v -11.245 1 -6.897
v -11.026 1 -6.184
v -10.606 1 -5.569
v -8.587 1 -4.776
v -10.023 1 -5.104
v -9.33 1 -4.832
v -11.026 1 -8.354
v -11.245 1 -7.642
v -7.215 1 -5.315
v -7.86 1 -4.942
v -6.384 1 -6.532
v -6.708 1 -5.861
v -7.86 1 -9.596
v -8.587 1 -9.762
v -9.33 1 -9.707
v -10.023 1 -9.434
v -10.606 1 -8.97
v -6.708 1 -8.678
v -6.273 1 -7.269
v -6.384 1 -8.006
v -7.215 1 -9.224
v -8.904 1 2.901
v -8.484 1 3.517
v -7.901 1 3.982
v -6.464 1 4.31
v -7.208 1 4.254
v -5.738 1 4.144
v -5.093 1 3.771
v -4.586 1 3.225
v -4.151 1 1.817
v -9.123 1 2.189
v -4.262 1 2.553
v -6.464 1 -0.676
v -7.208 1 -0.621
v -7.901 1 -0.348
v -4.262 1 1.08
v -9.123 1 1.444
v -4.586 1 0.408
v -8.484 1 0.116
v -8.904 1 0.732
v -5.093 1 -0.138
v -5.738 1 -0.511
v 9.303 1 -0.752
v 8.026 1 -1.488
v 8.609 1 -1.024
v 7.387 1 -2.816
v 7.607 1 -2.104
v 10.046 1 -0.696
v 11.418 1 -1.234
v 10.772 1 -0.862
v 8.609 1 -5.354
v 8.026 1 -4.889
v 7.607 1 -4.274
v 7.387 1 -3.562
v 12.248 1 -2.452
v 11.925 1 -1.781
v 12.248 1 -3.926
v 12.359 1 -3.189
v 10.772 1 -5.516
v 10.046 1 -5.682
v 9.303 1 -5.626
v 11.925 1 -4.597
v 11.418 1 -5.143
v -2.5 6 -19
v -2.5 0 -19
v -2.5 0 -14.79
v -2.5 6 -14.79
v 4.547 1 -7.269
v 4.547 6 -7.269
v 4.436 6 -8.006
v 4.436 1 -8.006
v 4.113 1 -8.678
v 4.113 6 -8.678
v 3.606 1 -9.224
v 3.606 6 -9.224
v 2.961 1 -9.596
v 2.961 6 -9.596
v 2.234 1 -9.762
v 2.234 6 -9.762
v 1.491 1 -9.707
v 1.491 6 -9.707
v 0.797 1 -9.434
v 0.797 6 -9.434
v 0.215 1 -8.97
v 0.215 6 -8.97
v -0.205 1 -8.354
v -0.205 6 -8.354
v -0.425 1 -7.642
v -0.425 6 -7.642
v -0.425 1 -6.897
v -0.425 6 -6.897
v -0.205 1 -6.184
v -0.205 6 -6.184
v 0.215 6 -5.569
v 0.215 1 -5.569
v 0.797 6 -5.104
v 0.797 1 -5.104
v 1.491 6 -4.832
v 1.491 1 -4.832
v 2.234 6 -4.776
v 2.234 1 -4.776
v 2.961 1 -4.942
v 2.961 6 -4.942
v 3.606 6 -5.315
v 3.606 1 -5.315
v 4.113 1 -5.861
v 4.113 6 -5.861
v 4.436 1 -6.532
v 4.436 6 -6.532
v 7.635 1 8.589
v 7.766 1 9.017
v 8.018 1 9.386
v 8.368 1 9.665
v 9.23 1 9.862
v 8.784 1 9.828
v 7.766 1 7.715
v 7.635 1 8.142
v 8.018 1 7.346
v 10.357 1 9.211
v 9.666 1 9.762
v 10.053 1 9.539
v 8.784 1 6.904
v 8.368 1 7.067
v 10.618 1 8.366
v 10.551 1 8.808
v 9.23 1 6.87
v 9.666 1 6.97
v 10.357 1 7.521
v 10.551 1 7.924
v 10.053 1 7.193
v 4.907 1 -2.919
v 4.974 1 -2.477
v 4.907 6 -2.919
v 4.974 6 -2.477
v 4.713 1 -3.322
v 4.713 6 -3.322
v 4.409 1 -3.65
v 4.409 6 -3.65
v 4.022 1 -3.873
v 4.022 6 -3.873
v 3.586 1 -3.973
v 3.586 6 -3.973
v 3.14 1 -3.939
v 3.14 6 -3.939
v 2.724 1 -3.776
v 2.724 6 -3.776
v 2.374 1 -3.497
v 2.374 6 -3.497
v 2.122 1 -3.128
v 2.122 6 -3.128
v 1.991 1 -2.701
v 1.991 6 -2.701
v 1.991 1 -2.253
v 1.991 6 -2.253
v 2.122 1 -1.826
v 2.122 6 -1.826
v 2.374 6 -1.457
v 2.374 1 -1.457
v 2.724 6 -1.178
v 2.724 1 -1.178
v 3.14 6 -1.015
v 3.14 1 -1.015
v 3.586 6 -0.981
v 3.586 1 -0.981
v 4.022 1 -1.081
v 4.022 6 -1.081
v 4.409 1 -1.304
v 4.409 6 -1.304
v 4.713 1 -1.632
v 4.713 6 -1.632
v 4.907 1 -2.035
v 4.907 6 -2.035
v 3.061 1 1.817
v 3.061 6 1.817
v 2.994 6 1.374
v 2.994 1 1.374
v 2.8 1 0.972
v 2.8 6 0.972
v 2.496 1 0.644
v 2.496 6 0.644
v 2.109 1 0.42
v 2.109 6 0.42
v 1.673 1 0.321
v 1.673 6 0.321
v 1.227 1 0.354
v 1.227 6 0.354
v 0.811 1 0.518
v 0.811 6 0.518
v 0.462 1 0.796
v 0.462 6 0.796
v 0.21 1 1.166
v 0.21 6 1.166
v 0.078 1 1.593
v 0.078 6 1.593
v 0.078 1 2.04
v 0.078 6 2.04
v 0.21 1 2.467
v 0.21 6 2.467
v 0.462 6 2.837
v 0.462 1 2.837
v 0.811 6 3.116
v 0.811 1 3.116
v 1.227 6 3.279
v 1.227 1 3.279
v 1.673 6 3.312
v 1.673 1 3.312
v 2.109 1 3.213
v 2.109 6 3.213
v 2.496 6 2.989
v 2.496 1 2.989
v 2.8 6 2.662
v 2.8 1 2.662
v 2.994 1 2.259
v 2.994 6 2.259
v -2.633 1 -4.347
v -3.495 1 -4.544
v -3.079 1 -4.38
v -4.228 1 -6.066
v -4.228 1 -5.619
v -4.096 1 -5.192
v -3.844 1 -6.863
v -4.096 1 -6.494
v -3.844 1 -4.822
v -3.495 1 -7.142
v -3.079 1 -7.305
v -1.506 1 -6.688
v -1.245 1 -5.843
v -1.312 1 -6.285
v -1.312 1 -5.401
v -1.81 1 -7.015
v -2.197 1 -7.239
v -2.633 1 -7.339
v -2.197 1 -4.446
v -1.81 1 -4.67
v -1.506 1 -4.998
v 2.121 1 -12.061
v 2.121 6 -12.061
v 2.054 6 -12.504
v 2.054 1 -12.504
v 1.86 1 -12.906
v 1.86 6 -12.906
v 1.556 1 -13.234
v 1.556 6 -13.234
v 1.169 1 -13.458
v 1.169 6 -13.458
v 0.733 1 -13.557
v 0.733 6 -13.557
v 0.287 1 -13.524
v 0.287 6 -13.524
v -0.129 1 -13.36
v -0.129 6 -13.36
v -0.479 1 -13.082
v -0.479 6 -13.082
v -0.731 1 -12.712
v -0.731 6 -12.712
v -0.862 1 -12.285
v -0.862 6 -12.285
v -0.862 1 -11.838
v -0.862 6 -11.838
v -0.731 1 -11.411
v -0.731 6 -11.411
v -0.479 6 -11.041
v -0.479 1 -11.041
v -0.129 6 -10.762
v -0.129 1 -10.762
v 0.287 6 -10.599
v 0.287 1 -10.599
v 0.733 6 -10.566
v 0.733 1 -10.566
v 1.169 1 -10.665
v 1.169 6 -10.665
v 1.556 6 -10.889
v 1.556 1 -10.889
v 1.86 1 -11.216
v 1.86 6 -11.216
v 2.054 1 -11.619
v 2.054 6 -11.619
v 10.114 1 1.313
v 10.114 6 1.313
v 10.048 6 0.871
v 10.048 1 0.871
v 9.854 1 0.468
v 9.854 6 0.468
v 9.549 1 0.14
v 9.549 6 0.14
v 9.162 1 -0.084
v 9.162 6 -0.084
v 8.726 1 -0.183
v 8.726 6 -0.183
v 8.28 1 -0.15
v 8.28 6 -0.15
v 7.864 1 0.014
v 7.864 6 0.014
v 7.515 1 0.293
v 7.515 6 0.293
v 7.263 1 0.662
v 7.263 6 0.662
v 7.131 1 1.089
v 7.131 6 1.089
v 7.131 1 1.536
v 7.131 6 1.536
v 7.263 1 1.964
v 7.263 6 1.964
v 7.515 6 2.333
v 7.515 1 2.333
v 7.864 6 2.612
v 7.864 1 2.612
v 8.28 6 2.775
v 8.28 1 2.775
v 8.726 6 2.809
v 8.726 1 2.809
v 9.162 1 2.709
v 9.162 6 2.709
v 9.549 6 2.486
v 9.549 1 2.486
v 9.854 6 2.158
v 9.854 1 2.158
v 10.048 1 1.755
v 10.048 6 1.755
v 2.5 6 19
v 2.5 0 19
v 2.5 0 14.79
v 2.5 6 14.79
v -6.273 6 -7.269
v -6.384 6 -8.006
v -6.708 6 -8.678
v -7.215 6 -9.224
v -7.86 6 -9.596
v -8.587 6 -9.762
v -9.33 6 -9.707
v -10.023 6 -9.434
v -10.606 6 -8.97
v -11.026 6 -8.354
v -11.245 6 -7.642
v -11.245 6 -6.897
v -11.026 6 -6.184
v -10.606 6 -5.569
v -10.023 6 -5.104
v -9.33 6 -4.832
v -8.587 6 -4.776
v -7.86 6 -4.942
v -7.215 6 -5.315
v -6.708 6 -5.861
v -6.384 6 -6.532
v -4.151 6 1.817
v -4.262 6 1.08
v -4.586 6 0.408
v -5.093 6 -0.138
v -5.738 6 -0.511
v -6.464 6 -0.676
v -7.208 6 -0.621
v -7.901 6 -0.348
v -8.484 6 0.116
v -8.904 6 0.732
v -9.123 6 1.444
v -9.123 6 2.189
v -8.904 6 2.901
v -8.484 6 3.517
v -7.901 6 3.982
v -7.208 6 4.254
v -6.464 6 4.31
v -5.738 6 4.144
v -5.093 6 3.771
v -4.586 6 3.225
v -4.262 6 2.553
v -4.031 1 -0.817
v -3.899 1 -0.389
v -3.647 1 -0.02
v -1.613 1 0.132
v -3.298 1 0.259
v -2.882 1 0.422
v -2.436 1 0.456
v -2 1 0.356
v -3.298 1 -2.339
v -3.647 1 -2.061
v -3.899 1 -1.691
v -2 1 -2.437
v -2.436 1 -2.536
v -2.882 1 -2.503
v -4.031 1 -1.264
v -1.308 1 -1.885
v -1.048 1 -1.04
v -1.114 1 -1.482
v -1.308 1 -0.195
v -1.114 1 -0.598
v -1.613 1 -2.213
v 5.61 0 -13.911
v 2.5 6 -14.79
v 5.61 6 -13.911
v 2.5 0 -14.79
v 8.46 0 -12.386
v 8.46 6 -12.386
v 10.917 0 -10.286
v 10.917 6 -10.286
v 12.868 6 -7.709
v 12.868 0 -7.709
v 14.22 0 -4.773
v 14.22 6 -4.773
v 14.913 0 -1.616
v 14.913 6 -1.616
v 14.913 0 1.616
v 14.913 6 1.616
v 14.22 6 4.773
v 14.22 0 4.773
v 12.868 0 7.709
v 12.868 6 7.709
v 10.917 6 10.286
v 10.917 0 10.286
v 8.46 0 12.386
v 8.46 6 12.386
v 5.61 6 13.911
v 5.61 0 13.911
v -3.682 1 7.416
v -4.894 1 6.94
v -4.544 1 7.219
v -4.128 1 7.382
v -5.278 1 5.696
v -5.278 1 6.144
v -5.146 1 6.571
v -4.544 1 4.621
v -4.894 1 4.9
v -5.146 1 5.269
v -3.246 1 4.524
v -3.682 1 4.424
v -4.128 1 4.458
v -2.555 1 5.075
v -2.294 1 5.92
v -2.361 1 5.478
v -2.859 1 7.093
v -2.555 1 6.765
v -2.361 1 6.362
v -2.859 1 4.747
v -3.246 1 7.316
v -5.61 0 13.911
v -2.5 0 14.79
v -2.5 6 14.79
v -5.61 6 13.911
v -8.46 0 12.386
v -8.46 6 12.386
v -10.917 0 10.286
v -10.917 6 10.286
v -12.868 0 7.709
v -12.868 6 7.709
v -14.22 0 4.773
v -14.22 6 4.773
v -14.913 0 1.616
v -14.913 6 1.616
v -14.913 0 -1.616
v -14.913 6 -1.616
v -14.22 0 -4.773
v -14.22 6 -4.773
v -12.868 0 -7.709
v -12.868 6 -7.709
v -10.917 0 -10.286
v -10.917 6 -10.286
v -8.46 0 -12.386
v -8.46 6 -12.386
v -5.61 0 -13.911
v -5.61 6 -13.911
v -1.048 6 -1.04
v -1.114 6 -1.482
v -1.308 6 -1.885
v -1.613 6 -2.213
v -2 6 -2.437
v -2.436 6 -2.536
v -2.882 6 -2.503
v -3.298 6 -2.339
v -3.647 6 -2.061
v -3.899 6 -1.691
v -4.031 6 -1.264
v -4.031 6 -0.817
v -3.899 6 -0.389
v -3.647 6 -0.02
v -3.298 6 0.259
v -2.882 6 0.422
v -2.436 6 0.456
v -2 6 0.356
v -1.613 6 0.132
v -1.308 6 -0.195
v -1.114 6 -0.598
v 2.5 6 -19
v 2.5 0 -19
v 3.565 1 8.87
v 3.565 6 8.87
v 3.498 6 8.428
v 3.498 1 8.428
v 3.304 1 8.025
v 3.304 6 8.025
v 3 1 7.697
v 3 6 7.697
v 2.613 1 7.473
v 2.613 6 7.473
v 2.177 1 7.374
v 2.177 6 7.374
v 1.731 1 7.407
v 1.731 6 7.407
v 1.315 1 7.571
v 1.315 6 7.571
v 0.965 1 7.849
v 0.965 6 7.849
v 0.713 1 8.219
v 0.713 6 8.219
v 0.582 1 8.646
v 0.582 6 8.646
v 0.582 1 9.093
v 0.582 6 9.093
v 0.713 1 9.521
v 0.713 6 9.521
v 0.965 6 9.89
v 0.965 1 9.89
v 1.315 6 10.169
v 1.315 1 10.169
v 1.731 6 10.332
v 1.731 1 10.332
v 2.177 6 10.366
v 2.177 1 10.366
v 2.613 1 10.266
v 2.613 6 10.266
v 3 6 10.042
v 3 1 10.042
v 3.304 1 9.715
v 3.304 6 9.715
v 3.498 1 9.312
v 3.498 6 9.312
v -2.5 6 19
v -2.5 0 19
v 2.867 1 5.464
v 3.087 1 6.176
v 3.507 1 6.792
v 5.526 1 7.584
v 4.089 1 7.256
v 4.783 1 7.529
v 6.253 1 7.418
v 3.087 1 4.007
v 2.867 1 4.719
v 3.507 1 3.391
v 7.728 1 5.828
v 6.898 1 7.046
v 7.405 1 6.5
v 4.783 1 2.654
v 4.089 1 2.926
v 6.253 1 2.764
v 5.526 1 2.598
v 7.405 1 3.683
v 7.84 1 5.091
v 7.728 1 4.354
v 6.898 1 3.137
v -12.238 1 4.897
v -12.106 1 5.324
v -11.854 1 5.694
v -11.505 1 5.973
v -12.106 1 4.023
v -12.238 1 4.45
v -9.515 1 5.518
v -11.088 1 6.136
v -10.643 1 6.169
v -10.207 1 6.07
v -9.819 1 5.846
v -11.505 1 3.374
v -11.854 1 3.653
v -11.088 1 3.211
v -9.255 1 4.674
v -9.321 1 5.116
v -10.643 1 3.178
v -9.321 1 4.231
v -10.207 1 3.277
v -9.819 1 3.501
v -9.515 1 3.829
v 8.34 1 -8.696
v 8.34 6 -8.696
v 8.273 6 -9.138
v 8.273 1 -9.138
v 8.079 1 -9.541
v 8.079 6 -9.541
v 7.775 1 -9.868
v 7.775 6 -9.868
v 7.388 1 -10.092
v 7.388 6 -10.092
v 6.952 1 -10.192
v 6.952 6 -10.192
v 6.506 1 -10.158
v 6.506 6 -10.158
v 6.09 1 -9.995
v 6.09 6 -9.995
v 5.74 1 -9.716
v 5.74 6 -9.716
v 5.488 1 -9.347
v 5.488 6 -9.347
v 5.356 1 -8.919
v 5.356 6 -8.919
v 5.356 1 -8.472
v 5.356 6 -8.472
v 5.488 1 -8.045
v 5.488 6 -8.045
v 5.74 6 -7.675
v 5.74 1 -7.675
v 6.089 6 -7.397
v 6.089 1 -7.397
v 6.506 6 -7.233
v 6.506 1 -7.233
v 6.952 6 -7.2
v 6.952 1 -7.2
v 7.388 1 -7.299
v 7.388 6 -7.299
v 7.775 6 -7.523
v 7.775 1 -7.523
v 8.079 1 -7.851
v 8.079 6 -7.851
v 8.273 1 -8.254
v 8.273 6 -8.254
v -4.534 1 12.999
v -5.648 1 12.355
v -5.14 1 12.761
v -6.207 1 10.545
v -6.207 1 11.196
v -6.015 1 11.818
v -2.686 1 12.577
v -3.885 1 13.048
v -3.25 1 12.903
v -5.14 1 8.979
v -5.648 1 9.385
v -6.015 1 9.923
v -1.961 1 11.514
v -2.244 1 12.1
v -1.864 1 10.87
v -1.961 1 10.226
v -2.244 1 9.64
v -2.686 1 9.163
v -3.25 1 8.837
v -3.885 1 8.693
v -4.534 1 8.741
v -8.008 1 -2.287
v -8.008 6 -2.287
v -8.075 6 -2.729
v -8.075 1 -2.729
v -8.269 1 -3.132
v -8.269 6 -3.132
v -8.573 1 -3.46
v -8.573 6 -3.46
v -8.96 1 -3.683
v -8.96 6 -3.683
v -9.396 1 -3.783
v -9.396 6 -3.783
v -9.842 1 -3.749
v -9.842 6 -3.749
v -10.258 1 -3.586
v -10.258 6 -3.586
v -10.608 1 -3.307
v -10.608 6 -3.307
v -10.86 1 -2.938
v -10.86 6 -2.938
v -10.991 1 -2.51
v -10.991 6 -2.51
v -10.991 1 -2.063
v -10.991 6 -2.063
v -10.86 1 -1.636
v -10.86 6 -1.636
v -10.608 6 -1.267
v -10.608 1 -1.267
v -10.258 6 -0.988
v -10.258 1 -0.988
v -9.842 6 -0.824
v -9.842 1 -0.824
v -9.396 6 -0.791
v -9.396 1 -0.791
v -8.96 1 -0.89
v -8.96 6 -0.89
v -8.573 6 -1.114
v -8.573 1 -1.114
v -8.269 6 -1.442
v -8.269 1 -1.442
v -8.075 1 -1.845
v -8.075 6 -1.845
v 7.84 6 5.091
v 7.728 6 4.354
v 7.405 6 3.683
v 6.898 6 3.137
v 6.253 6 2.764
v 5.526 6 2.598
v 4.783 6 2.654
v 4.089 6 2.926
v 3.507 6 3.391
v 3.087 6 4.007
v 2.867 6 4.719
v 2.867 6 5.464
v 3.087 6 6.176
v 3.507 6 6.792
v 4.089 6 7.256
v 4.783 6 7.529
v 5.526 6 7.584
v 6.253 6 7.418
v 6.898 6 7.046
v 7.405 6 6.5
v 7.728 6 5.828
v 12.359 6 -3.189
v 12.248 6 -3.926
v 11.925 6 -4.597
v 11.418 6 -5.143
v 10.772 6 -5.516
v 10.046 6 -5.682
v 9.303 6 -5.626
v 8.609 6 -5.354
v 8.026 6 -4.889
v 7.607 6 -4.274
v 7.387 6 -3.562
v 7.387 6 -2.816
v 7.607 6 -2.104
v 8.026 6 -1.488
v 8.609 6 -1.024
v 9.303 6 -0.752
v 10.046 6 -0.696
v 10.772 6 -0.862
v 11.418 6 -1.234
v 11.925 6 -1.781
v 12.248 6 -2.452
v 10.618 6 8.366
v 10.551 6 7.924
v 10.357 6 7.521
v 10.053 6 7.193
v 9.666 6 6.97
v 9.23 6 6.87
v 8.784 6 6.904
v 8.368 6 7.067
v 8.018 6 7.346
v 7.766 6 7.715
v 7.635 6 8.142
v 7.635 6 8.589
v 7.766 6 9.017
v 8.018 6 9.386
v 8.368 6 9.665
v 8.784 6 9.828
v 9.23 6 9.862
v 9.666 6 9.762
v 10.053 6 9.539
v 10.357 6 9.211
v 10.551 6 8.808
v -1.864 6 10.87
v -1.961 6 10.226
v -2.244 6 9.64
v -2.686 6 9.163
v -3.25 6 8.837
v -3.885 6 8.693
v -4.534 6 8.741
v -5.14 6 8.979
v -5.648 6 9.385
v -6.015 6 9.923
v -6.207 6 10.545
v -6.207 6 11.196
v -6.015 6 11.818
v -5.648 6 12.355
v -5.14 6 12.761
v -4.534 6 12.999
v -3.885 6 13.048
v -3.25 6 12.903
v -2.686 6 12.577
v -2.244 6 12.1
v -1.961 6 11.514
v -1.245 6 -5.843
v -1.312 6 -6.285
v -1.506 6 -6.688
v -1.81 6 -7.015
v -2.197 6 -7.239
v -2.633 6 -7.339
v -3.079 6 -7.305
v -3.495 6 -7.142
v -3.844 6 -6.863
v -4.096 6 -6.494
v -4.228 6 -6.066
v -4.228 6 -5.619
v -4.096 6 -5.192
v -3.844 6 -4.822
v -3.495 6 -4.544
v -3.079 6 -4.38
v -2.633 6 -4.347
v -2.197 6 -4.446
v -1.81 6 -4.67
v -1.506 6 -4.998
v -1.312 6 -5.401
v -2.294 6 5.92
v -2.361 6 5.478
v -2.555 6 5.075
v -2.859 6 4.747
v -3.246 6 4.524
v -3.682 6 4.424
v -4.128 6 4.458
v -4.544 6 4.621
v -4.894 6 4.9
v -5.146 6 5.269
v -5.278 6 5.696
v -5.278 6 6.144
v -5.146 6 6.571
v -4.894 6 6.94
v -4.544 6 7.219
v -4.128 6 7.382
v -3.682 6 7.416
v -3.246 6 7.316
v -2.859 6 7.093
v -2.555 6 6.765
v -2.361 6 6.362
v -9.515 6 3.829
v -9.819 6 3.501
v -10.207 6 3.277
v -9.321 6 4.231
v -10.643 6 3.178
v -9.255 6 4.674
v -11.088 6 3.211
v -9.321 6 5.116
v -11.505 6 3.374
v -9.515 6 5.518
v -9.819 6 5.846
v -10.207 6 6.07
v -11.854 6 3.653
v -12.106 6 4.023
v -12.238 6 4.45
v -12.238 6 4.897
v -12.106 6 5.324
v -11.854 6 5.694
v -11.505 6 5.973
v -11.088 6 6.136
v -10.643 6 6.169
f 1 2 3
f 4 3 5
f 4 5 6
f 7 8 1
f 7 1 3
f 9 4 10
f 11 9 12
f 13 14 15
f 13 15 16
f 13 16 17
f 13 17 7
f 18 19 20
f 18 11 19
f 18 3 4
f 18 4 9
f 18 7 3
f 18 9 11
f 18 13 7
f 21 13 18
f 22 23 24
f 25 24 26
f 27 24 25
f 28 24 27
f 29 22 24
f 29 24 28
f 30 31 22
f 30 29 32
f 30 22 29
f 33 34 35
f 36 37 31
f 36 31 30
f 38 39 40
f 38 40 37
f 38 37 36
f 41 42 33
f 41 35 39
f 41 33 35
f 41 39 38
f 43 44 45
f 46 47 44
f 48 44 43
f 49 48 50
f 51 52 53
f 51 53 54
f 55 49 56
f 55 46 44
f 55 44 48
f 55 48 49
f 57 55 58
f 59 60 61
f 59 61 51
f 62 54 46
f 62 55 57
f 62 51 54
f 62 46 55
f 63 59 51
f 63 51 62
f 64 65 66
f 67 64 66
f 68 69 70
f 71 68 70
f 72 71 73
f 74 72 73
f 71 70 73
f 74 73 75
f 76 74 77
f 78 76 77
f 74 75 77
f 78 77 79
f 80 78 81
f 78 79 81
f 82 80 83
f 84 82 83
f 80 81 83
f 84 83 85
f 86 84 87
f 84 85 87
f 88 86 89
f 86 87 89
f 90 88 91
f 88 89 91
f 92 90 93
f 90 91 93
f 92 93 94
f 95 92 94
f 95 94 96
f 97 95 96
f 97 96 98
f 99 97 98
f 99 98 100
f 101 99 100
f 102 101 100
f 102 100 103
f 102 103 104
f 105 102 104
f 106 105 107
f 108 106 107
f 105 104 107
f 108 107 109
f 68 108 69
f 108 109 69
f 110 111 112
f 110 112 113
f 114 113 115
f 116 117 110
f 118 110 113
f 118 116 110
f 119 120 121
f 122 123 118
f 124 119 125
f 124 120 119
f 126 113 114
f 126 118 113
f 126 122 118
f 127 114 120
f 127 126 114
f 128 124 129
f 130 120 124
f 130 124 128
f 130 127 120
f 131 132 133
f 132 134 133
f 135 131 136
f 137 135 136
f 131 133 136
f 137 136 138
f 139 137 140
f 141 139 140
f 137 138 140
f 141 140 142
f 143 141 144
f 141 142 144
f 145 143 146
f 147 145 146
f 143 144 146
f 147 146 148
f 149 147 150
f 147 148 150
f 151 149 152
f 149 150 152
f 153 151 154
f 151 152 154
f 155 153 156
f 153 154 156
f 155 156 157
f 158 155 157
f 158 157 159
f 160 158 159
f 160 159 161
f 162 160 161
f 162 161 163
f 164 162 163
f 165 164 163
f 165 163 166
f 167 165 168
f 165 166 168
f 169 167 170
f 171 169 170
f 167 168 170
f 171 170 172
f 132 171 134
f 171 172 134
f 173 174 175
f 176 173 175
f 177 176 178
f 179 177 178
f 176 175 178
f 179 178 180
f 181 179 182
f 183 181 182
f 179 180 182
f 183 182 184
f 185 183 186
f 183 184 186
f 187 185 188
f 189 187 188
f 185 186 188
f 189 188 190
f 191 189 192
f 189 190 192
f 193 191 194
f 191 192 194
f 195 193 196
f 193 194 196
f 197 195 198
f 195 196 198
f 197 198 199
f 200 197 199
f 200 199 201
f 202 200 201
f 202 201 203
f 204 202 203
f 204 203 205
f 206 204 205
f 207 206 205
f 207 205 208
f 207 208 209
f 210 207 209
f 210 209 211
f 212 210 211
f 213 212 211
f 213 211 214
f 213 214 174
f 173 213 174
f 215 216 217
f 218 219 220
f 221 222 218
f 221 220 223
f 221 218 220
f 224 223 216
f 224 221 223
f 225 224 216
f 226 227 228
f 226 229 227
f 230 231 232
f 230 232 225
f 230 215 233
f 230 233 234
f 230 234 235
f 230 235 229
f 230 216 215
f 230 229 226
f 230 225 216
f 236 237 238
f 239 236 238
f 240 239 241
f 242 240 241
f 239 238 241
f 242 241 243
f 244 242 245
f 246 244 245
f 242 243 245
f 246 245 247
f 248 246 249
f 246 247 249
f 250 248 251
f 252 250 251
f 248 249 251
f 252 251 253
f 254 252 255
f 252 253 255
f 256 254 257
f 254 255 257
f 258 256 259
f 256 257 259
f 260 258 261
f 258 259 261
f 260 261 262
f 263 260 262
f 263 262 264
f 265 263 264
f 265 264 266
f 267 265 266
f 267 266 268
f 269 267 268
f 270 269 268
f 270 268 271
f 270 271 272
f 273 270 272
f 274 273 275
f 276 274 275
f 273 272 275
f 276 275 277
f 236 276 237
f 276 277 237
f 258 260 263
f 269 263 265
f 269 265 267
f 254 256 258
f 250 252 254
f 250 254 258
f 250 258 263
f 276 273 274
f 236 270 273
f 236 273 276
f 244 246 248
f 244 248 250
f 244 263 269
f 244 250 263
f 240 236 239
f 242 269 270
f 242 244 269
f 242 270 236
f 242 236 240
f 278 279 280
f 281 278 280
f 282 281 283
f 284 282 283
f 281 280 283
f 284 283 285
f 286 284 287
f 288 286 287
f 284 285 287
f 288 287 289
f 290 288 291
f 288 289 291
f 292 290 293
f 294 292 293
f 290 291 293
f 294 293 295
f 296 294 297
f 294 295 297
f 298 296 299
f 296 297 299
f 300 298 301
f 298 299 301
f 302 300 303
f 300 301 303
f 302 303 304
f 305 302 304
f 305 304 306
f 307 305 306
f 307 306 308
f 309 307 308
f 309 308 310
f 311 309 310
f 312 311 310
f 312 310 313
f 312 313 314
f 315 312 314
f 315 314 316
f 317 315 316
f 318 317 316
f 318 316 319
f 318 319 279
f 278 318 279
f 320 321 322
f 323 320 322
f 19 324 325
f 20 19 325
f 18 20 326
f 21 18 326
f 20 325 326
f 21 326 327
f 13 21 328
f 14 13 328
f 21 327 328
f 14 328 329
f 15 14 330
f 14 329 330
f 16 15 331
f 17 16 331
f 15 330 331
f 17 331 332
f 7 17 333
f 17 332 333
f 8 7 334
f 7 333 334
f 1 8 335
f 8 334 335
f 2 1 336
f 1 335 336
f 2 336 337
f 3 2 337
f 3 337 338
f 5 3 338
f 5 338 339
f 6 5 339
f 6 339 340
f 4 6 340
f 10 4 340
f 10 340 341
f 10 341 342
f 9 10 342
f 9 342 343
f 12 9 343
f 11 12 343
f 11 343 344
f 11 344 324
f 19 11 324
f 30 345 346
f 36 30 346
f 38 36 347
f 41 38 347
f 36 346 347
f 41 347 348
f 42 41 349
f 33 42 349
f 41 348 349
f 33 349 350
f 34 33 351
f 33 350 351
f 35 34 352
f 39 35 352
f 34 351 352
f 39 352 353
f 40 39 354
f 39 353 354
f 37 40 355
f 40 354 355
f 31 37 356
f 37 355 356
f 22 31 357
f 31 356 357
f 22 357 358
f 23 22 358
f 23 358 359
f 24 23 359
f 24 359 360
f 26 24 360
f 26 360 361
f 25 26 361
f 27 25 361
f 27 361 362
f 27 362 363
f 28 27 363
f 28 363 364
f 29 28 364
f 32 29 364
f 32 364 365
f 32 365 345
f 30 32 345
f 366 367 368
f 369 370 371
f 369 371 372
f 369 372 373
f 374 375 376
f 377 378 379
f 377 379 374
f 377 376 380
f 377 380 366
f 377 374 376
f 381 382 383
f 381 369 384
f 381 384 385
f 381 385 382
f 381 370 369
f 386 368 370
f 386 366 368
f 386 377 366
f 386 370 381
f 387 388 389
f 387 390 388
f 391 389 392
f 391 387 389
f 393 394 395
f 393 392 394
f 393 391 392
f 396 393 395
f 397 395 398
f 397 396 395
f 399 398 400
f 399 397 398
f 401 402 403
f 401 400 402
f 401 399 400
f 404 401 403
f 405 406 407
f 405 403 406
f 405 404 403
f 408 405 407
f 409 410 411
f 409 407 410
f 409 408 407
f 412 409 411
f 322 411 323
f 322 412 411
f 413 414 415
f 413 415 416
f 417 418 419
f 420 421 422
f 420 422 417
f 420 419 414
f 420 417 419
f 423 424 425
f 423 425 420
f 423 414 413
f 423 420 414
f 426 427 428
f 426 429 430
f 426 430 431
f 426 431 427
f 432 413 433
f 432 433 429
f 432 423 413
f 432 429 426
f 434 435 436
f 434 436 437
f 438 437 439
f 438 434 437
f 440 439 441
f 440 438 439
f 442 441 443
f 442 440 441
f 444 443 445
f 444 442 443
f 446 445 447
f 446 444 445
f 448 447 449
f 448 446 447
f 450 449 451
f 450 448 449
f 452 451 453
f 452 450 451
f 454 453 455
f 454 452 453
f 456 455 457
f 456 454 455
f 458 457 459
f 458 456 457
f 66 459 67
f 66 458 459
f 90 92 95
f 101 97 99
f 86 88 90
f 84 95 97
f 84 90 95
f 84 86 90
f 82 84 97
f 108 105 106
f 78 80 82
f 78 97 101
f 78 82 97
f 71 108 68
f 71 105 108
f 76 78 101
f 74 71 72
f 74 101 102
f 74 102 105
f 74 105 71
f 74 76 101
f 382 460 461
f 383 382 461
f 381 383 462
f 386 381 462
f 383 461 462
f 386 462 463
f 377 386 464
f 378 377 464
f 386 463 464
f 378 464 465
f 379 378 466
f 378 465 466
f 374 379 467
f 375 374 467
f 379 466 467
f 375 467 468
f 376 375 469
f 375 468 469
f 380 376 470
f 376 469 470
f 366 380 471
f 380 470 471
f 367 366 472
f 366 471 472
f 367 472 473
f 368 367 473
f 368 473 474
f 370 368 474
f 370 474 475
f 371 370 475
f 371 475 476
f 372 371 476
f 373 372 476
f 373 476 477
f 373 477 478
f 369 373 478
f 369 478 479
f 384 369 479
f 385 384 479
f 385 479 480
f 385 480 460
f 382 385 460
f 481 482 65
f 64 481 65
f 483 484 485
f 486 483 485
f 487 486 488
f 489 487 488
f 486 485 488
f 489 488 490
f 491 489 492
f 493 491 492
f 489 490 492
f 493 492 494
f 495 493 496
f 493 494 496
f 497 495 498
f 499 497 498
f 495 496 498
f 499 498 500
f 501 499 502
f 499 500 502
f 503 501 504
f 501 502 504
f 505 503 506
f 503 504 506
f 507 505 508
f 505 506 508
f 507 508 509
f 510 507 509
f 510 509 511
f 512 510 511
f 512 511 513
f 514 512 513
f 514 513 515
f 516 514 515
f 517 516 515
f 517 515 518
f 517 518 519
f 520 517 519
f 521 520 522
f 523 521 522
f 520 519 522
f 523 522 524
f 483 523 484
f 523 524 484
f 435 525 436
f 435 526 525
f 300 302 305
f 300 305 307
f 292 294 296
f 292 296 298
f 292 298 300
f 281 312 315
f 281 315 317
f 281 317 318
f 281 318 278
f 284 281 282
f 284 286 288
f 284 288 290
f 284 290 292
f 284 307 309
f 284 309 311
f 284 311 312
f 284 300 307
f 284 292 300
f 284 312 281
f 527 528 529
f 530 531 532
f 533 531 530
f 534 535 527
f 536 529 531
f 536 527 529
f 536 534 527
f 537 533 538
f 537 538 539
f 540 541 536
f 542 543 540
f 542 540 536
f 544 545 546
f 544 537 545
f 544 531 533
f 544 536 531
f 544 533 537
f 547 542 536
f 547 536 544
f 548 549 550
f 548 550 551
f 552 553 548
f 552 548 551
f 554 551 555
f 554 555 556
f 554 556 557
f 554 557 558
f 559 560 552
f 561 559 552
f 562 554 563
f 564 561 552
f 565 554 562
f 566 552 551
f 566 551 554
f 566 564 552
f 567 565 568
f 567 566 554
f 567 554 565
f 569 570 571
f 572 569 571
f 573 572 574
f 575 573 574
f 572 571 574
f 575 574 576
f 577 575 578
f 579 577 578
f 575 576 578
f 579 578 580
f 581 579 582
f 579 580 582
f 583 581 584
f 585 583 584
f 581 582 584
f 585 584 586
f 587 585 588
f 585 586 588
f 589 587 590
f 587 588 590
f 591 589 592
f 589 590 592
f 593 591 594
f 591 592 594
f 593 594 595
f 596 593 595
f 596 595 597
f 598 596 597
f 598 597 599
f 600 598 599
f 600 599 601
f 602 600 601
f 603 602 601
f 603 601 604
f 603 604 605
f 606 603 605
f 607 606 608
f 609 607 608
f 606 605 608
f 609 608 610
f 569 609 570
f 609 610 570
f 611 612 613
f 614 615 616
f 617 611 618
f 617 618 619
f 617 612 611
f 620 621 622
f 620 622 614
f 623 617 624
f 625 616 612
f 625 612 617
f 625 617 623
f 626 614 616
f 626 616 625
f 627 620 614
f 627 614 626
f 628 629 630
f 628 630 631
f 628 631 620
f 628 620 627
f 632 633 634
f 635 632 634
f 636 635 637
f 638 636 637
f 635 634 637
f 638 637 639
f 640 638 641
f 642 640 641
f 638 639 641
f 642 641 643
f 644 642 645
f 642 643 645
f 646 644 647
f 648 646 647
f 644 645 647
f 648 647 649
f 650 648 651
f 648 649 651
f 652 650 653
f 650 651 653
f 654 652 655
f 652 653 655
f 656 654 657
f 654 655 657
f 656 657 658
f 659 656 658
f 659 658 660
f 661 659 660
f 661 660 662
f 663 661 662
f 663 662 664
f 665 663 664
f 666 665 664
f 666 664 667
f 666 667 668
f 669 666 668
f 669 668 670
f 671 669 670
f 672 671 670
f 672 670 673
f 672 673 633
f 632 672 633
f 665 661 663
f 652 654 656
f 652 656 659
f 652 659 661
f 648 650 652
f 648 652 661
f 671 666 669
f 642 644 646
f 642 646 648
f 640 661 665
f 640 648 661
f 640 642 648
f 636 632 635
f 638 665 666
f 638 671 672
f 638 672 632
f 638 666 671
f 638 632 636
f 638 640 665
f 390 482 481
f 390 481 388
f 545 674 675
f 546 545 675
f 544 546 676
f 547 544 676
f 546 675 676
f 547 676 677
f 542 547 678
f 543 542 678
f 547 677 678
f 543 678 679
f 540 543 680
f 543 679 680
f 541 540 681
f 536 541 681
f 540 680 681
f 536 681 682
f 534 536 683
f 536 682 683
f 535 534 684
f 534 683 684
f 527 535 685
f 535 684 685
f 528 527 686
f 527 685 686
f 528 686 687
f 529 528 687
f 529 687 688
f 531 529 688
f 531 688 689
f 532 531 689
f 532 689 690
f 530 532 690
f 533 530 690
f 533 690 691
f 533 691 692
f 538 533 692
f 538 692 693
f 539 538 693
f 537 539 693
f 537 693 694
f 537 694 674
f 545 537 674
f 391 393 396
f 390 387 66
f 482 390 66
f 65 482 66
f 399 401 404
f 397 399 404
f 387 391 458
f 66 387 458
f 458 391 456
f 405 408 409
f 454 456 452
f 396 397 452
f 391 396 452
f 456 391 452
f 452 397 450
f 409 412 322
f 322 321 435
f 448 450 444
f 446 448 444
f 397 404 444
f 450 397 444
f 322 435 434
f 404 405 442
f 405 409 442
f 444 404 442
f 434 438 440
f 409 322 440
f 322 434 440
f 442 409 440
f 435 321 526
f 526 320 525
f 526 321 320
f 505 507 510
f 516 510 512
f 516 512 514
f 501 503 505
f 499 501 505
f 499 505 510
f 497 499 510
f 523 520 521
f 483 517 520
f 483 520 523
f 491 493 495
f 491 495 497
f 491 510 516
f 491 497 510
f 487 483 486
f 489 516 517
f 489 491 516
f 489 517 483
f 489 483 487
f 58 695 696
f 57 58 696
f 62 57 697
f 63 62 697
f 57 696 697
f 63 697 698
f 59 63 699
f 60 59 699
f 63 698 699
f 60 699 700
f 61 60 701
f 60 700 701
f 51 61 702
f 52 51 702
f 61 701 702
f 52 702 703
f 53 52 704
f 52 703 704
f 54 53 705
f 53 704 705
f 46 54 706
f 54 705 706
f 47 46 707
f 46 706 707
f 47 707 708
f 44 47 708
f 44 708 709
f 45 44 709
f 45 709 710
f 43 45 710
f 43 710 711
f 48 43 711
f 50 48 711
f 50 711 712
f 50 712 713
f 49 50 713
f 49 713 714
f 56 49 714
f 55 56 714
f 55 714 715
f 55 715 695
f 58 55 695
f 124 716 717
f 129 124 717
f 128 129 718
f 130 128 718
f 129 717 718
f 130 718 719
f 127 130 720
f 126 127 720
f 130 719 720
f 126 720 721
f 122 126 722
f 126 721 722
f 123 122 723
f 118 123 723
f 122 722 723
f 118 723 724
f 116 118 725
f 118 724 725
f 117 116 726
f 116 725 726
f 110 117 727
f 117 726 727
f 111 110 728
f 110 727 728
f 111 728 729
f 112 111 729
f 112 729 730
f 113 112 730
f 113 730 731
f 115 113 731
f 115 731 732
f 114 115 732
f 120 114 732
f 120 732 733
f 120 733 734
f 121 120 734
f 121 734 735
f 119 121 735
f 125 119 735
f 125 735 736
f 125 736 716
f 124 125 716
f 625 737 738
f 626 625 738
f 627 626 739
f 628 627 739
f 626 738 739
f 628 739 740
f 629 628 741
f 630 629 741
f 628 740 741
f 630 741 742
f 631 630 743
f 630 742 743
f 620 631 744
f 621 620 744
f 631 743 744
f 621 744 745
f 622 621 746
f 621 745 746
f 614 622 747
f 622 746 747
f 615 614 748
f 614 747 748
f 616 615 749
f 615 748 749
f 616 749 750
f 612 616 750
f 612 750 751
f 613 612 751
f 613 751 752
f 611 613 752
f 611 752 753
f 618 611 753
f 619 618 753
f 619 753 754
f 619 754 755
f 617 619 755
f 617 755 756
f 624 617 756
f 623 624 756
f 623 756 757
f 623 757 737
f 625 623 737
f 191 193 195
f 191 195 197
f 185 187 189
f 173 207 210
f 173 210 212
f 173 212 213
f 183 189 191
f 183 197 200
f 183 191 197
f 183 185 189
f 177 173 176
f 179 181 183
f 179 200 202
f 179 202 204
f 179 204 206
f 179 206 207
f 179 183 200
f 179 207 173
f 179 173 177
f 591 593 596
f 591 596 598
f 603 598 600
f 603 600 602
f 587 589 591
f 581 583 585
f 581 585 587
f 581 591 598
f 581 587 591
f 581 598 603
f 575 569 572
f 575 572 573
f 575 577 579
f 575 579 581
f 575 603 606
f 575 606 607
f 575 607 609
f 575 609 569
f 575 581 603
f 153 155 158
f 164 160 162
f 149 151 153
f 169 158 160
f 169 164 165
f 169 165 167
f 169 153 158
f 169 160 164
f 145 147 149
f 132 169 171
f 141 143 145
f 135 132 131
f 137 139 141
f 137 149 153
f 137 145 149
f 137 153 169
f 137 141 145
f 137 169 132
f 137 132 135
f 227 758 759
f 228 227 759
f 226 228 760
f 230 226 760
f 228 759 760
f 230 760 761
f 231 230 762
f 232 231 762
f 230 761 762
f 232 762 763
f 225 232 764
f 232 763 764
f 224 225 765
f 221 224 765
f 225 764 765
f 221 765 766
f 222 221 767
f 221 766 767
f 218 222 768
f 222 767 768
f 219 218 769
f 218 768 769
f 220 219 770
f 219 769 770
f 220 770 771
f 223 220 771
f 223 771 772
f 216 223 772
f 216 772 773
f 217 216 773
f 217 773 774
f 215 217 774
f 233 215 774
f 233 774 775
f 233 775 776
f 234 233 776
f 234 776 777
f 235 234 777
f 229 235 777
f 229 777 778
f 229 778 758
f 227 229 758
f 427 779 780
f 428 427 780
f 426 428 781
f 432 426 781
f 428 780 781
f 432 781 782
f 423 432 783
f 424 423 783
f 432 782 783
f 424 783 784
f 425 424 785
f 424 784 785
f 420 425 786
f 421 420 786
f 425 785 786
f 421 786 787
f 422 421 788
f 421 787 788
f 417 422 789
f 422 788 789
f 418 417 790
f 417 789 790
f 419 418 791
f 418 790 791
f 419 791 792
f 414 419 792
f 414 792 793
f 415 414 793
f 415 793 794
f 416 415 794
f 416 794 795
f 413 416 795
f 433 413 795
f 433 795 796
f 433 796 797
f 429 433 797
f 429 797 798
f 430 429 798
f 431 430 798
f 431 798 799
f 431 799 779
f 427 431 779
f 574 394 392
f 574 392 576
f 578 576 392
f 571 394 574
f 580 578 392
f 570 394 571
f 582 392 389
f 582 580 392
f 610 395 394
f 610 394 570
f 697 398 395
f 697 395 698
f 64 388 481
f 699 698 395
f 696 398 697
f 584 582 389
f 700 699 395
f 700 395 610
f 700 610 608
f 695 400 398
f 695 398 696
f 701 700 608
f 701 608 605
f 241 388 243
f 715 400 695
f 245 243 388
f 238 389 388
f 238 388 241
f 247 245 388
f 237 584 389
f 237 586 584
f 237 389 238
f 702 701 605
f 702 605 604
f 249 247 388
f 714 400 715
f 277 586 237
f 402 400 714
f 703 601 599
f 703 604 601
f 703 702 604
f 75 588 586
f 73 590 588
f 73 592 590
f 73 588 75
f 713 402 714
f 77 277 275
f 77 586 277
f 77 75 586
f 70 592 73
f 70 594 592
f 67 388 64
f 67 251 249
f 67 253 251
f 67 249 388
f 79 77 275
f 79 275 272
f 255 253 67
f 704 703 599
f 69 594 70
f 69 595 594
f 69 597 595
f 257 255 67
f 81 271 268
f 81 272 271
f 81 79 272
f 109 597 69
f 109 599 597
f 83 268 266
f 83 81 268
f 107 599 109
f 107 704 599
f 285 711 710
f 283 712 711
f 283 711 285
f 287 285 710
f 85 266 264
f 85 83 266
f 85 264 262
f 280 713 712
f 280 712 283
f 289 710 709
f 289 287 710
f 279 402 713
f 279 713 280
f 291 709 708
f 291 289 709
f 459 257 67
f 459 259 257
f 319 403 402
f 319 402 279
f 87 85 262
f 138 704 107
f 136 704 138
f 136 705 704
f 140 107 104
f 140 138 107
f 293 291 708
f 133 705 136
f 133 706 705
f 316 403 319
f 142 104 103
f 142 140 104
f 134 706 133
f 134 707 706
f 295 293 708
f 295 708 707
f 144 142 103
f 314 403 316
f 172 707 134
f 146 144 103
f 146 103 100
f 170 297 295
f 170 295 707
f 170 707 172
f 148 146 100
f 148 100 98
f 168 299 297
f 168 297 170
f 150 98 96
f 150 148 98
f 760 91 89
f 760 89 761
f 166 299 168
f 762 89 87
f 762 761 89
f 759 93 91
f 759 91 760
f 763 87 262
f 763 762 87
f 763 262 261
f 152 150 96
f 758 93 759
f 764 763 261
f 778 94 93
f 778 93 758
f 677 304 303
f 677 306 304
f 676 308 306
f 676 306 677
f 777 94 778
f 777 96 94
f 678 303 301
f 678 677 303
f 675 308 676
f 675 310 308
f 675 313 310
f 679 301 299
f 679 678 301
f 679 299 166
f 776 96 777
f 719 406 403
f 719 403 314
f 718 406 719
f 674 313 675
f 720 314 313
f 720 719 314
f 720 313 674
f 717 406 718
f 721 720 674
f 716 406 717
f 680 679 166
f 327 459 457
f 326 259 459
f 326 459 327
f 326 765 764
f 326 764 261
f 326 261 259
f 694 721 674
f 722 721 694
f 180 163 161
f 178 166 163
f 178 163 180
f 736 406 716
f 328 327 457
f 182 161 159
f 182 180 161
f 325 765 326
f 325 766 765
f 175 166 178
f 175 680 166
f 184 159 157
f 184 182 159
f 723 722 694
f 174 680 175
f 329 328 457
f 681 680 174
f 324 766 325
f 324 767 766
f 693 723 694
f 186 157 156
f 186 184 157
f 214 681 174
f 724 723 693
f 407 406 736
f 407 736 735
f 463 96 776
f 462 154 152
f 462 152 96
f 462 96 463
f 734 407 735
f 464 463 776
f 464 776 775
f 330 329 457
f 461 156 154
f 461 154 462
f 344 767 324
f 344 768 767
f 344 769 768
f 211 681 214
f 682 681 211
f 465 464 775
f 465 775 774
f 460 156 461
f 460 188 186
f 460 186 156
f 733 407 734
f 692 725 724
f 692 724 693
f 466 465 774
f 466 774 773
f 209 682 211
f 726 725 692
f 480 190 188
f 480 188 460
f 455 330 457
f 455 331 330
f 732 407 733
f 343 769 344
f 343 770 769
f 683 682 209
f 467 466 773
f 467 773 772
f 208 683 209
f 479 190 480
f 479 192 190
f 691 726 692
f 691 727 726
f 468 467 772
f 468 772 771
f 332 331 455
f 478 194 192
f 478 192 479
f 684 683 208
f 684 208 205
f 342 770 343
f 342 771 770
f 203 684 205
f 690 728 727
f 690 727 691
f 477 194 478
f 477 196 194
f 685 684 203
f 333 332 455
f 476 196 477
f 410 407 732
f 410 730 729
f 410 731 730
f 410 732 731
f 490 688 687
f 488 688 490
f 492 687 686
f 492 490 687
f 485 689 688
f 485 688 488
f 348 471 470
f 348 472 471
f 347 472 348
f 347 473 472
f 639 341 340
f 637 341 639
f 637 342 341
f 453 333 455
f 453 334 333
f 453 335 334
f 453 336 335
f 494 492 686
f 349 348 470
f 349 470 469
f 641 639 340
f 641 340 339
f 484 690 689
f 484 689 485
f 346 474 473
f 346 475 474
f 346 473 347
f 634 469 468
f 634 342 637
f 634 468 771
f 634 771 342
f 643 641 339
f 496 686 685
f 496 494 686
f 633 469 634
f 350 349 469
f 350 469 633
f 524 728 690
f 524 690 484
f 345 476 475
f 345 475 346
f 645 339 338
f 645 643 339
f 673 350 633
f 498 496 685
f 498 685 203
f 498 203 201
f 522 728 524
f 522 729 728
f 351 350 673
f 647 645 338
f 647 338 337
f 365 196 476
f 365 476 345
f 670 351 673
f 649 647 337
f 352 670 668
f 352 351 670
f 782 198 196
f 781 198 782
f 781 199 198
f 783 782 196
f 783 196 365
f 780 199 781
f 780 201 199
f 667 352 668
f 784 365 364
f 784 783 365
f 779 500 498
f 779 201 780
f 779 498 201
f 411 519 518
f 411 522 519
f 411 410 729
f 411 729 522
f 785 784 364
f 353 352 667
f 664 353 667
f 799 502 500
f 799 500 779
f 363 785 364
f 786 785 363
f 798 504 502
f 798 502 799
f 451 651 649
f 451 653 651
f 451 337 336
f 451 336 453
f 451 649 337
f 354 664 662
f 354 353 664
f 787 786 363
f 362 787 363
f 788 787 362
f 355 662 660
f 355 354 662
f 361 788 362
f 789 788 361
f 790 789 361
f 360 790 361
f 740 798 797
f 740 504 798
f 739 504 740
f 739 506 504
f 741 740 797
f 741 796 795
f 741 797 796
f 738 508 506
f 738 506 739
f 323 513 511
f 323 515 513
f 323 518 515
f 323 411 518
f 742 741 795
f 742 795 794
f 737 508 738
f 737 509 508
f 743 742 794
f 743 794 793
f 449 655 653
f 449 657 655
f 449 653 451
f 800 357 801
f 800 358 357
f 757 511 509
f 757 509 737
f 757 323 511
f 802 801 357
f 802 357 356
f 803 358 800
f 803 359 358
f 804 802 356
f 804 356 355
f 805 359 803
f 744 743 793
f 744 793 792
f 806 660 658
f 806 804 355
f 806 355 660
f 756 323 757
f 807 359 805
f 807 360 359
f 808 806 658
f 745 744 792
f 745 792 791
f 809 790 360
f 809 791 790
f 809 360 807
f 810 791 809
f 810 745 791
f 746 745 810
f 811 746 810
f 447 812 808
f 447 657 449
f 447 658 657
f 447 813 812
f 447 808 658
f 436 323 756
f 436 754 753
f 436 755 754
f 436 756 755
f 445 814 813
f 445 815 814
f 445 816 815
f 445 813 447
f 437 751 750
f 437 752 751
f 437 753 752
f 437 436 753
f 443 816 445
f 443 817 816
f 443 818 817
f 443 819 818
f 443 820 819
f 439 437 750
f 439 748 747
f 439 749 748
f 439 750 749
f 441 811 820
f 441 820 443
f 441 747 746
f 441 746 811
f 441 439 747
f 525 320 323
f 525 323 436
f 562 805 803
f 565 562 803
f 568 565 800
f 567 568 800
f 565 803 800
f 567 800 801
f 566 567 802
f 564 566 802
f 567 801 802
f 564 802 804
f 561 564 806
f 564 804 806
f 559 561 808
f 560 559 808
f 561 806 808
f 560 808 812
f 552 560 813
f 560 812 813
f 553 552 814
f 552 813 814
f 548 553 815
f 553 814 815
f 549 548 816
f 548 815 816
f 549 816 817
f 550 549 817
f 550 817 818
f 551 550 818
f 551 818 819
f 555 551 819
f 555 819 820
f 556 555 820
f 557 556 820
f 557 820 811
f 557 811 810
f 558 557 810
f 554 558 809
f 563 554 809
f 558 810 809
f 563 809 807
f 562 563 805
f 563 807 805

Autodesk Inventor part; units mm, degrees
ref_plane "YZ Plane" through (0, 0, 0) normal (1, 0, 0) x (0, 1, 0)
ref_plane "XZ Plane" through (0, 0, 0) normal (0, 1, 0) x (-1, 0, 0)
ref_plane "XY Plane" through (0, 0, 0) normal (0, 0, 1) x (1, 0, 0)
sketch "Sketch1" plane through (0, 0, 0) normal (0, 1, 0) x (-1, 0, 0)
  circle A0 centre (0, 0) radius 15
  line L0 (0, -15) -> (0, -19)
  line L1 (0, -19) -> (2.5, -19)
  line L2 (2.5, -19) -> (2.5, -14.7902)
  line L3 (0, -19) -> (-2.5, -19)
  line L4 (-2.5, -19) -> (-2.5, -14.7902)
  line L5 (6.6169, 0) -> (-6.6879, 0)
  line L6 (0, 15) -> (0, 19)
  line L7 (0, 19) -> (2.5, 19)
  line L8 (2.5, 19) -> (2.5, 14.7902)
  line L9 (0, 19) -> (-2.5, 19)
  line L10 (-2.5, 19) -> (-2.5, 14.7902)
  point P0 (2.5, 14.7902)
  point P1 (-2.5, 14.7902)
  dimension "d0" = 4
  dimension "d1" = 2.5
  dimension "d13" = 30
extrude "Extrusion1" add sketch "Sketch1" along normal blind 6
sketch "Sketch2" plane through (0, 6, 0) normal (0, 1, 0) x (1, 0, 0)
  circle A0 centre (2.0473, 7.2692) radius 2.5
  circle A1 centre (2.0473, 7.2692) radius 5 construction
  circle A2 centre (6.8395, 8.6957) radius 1.5
  circle A3 centre (2.0473, 7.2692) radius 5 construction
  circle A4 centre (0.6208, 12.0614) radius 1.5
  circle A5 centre (2.0473, 7.2692) radius 5 construction
  circle A6 centre (-2.7449, 5.8427) radius 1.5
  circle A7 centre (2.0473, 7.2692) radius 5 construction
  circle A8 centre (3.4738, 2.477) radius 1.5
  circle A9 centre (-6.6513, -1.8166) radius 2.5
  circle A10 centre (-6.6513, -1.8166) radius 5 construction
  circle A11 centre (-9.5082, 2.2868) radius 1.5
  circle A12 centre (-6.6513, -1.8166) radius 5 construction
  circle A13 centre (-10.7547, -4.6735) radius 1.5
  circle A14 centre (-6.6513, -1.8166) radius 5 construction
  circle A15 centre (-3.7944, -5.92) radius 1.5
  circle A16 centre (-6.6513, -1.8166) radius 5 construction
  circle A17 centre (-2.5478, 1.0403) radius 1.5
  circle A18 centre (5.3395, -5.0913) radius 2.5
  circle A19 centre (5.3395, -5.0913) radius 5 construction
  circle A20 centre (2.0648, -8.8697) radius 1.5
  circle A21 centre (5.3395, -5.0913) radius 5 construction
  circle A22 centre (9.1179, -8.3659) radius 1.5
  circle A23 centre (5.3395, -5.0913) radius 5 construction
  circle A24 centre (8.6142, -1.3128) radius 1.5
  circle A25 centre (5.3395, -5.0913) radius 5 construction
  circle A26 centre (1.5611, -1.8166) radius 1.5
  circle A27 centre (-8.7734, 7.2692) radius 2.5
  circle A28 centre (9.859, 3.1889) radius 2.5
  circle A29 centre (-4.0478, -10.8701) radius 2.1836
  dimension "d17" = 10
  dimension "d23" = 10
  dimension "d35" = 10
  dimension "d16" = 5
  dimension "d18" = 3
  dimension "d19" = 360
  dimension "d22" = 5
  dimension "d24" = 3
  dimension "d25" = 360
  dimension "d34" = 5
  dimension "d36" = 3
  dimension "d37" = 360
  dimension "d38" = 5
  dimension "d39" = 5
extrude "Extrusion2" cut sketch "Sketch2" against normal blind 5
sketch "Sketch3" plane through (0, 6, 0) normal (0, 1, 0) x (1, 0, 0)
  point P0 (0, 0)
properties part number "joy stick part 1"
